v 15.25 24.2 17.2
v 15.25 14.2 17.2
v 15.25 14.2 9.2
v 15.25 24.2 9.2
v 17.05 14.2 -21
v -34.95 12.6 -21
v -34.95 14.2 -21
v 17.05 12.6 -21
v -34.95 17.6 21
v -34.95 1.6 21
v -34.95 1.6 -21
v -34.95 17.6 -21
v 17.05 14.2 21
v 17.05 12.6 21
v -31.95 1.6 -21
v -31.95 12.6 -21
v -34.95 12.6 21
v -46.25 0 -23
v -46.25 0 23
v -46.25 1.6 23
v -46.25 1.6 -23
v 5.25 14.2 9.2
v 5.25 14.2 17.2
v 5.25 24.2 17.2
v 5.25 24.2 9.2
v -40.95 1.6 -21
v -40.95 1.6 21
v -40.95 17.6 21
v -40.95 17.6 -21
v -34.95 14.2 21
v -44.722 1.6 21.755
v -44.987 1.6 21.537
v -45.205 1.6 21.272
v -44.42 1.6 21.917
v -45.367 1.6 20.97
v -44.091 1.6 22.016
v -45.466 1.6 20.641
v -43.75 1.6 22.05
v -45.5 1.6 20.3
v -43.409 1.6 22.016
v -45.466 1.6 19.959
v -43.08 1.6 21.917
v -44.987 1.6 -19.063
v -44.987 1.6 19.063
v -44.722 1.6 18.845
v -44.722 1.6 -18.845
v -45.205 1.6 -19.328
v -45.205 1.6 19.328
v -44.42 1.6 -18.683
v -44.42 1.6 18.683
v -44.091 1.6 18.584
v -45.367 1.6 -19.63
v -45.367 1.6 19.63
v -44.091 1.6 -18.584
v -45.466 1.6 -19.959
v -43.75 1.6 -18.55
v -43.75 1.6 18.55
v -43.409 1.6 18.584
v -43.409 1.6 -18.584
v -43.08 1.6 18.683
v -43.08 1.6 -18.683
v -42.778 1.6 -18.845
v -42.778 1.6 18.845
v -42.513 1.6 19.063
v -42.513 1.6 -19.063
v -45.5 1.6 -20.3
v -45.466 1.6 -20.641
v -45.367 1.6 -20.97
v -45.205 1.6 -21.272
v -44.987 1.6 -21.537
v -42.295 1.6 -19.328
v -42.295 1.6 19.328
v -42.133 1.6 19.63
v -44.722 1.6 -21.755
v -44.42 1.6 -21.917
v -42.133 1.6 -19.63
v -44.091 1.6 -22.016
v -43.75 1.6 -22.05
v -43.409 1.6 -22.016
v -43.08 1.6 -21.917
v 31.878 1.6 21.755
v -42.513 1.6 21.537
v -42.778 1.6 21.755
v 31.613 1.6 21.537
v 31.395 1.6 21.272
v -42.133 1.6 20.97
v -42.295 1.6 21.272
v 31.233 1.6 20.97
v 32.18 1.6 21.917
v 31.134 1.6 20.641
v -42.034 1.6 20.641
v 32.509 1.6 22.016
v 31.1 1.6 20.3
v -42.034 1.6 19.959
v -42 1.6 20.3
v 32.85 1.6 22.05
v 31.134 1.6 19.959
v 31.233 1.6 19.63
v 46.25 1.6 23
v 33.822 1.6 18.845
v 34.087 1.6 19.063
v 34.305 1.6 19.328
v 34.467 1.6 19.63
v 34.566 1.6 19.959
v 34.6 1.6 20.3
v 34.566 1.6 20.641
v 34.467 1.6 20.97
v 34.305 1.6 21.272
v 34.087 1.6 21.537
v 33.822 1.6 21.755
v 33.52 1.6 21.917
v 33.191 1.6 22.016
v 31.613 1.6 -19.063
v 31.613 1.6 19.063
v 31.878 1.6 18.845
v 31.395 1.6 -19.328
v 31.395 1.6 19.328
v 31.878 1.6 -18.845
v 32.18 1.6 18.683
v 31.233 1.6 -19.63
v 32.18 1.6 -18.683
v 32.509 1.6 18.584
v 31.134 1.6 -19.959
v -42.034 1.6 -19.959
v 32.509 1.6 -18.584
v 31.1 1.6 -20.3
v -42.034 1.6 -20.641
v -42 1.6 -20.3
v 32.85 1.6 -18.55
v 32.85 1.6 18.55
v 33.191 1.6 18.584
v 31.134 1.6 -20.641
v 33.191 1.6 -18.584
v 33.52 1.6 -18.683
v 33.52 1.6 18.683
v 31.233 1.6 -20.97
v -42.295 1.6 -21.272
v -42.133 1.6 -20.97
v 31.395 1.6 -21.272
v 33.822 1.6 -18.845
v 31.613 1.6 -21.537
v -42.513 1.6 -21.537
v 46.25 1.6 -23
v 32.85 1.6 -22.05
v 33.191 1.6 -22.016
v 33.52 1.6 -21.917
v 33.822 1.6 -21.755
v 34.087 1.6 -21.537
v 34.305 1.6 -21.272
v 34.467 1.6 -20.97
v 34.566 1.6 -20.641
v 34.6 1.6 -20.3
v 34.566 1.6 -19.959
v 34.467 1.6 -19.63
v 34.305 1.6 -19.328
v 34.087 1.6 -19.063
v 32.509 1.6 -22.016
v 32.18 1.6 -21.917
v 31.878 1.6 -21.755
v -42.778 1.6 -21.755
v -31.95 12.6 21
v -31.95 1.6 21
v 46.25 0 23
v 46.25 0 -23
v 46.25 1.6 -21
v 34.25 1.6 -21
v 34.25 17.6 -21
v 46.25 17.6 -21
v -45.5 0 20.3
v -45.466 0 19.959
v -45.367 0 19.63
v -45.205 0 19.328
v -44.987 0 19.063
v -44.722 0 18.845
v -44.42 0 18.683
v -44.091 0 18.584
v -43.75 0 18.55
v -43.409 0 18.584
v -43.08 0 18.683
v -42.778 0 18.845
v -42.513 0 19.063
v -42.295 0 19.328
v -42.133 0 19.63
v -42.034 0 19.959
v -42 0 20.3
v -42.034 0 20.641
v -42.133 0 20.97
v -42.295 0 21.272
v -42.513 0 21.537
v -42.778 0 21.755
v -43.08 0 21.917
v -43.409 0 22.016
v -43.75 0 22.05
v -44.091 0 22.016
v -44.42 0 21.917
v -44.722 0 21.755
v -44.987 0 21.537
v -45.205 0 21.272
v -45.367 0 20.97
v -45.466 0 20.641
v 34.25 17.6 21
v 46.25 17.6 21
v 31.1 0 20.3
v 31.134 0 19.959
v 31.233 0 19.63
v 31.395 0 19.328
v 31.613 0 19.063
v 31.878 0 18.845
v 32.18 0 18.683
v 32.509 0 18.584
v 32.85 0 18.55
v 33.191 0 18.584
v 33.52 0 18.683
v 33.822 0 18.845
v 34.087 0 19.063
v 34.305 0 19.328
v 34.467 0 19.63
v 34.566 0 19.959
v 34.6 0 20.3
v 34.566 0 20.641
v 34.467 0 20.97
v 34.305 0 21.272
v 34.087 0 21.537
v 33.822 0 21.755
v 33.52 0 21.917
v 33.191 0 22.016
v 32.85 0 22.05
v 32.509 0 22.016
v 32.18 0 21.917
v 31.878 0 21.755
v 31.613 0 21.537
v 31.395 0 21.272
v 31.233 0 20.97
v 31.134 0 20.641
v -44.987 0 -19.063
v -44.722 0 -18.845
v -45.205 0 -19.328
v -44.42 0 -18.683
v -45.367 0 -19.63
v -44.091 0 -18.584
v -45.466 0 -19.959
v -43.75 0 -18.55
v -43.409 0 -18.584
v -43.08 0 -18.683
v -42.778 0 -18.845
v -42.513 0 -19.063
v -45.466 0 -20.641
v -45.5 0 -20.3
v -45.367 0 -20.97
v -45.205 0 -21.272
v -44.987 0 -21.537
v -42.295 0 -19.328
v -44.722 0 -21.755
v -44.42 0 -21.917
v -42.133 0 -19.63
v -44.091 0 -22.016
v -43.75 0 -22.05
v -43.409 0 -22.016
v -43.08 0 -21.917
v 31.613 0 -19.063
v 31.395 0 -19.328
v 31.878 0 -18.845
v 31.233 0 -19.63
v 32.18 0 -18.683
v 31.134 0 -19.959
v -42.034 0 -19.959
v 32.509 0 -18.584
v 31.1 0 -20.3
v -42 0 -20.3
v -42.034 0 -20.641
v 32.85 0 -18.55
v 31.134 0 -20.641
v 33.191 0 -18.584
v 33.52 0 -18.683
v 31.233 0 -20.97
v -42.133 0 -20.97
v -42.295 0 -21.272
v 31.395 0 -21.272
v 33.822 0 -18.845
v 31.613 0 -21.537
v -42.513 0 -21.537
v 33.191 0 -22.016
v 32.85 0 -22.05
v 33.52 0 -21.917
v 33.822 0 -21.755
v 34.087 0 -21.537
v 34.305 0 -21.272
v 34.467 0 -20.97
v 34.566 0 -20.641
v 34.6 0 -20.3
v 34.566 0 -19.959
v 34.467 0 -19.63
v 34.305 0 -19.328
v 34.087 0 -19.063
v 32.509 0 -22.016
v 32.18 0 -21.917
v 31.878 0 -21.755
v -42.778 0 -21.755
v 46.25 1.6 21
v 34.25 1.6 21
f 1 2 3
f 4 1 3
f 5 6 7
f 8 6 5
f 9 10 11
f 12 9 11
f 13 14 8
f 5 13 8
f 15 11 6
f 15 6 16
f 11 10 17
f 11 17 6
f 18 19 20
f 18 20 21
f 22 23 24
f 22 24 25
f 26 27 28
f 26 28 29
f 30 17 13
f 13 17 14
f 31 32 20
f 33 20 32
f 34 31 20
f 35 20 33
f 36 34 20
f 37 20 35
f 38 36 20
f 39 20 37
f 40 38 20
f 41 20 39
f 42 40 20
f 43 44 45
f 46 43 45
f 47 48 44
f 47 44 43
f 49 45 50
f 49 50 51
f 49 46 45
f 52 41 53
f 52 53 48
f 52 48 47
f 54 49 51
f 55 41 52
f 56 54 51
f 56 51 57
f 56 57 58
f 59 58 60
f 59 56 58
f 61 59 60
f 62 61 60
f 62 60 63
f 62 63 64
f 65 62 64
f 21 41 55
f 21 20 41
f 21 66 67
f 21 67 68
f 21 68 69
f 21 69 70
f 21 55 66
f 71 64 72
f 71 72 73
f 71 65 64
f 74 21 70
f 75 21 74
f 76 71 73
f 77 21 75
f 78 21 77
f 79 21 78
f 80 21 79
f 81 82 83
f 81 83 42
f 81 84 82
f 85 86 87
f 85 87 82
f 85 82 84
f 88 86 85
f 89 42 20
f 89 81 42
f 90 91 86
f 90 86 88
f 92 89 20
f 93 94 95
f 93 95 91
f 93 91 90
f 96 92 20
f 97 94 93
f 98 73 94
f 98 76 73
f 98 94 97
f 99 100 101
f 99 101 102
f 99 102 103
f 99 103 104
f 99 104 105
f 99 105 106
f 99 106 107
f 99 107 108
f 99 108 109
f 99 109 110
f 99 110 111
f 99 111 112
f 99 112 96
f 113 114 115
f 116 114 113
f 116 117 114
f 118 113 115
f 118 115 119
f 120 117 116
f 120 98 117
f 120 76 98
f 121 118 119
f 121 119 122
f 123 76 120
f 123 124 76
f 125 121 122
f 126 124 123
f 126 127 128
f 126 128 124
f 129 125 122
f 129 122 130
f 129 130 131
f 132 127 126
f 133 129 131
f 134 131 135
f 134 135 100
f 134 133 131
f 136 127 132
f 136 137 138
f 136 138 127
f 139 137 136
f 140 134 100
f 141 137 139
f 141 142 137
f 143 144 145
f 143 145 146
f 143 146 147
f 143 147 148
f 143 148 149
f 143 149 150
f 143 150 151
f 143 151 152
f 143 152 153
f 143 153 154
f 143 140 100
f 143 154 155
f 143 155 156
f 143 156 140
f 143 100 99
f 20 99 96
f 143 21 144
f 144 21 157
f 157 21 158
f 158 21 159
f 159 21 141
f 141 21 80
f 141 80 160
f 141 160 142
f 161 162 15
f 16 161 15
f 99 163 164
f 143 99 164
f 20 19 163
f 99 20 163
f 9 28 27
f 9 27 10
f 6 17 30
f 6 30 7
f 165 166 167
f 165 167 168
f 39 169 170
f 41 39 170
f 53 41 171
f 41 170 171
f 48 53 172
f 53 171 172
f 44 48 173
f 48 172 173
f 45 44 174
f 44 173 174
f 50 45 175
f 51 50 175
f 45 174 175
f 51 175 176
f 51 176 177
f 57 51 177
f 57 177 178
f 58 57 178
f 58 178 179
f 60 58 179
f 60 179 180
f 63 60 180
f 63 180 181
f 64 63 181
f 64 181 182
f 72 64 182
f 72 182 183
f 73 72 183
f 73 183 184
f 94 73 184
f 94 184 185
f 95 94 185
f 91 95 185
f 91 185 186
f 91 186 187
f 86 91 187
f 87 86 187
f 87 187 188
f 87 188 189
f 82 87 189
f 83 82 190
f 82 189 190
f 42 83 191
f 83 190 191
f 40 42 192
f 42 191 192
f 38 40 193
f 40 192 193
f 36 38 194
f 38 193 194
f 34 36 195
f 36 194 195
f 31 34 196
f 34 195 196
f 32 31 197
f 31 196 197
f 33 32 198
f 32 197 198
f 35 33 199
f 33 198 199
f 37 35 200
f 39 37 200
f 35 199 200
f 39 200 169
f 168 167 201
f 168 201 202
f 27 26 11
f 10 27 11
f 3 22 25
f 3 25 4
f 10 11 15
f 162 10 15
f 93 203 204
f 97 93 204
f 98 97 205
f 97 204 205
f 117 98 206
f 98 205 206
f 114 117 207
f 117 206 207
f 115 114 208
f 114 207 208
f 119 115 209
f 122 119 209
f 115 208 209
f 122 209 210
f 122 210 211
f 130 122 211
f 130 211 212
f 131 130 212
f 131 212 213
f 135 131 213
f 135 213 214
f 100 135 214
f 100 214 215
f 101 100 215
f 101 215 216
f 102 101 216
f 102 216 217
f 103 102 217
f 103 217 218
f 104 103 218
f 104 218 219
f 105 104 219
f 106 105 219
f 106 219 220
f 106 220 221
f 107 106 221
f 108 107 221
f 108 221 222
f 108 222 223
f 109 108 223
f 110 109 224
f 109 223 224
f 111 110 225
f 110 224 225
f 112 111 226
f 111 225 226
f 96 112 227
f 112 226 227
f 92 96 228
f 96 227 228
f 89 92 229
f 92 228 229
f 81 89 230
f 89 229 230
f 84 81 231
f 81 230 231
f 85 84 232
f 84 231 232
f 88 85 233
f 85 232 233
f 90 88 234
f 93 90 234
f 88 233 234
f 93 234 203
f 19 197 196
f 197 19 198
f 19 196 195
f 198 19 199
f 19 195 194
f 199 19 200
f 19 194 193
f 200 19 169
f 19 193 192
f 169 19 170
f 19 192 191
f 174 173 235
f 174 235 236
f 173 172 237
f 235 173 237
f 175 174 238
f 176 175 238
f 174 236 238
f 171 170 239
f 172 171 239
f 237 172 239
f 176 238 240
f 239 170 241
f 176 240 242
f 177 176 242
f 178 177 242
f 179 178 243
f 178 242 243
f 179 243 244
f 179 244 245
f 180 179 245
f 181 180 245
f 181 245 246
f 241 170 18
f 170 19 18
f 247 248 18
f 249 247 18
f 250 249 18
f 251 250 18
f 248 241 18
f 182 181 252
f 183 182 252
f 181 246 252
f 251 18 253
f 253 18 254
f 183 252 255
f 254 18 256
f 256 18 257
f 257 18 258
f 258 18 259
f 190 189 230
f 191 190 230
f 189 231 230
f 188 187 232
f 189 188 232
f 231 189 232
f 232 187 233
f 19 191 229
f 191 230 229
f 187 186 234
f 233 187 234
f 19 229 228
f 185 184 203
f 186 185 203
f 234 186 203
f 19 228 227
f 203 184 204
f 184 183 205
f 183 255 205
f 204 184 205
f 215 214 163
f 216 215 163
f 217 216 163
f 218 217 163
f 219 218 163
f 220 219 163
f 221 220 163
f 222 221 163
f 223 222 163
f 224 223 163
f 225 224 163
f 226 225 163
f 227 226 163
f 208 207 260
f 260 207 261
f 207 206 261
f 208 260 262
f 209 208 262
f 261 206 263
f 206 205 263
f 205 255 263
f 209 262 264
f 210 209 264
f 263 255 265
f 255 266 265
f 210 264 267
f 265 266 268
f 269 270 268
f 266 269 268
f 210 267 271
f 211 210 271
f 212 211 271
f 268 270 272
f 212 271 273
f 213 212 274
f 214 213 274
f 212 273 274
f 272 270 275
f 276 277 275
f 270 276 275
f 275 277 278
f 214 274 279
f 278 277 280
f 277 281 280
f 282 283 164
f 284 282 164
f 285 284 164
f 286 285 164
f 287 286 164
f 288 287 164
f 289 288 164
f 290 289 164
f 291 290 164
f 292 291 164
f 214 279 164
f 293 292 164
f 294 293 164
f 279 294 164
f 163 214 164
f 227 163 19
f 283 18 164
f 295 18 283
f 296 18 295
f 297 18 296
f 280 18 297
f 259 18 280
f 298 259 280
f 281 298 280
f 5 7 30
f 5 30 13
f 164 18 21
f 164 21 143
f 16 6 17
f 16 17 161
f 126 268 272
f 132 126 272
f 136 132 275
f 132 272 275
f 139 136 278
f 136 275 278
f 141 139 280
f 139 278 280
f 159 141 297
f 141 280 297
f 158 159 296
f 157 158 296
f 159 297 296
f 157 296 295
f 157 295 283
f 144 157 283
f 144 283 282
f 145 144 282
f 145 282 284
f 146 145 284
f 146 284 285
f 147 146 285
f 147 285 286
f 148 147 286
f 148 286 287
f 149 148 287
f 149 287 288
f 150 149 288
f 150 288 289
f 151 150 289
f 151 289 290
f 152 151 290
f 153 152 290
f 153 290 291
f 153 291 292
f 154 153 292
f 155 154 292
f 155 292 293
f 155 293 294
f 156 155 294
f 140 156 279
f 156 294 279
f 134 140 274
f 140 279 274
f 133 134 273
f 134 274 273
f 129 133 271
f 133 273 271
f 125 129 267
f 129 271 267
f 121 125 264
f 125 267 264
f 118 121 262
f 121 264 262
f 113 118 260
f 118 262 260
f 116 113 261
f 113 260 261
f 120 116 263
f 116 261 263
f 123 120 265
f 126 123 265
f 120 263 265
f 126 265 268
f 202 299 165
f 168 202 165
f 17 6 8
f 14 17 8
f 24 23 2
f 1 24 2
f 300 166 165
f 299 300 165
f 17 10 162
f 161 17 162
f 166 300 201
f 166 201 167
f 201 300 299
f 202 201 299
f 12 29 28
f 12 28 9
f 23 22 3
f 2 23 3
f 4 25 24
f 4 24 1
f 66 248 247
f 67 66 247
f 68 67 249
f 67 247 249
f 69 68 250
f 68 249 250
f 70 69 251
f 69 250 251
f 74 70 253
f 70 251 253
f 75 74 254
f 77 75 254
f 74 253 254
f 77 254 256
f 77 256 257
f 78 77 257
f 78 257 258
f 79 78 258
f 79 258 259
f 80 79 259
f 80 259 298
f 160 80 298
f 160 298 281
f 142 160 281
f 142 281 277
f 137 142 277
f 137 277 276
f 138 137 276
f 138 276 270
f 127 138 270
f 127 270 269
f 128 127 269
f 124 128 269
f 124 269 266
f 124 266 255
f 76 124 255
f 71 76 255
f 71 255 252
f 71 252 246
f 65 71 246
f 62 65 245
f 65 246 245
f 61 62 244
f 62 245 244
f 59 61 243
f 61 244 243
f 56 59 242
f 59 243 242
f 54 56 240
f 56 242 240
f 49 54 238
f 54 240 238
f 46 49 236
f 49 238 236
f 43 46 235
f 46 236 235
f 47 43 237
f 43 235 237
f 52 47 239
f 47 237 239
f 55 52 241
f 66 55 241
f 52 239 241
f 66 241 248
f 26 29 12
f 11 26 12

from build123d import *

# Parameters (mm, degrees)
SKICA1_W                  = 92.5
SKICA1_H                  = 46
P_IDAT_VYSUNUT_M1_DEPTH   = 1.6
F_3_5_3_5_PR_M_R_D_RY1_D  = 3.5
SKICA4_W                  = 6
SKICA4_H                  = 42
P_IDAT_VYSUNUT_M2_DEPTH   = 16
SKICA4_W_2                = 12
P_IDAT_VYSUNUT_M2_2_DEPTH = 16
SKICA5_W                  = 3
SKICA5_H                  = 42
P_IDAT_VYSUNUT_M3_DEPTH   = 11
SKICA6_W                  = 52
SKICA6_H                  = 42
P_IDAT_VYSUNUT_M4_DEPTH   = 1.6
SKICA7_W                  = 10
SKICA7_H                  = 8
P_IDAT_VYSUNUT_M5_DEPTH   = 10


with BuildPart() as part:
    # Skica1 → Přidat vysunutím1 (new body)
    with BuildSketch(Plane(origin=(0, 0, 0), x_dir=(1, 0, 0), z_dir=(0, 1, 0))):
        Rectangle(SKICA1_W, SKICA1_H)
    extrude(amount=P_IDAT_VYSUNUT_M1_DEPTH)

    # Ø3.5 (3.5) průměr díry1 (through all)
    with Locations(Plane(origin=(0, 1.6, 0), x_dir=(1, 0, 0), z_dir=(0, 1, 0))):
        with Locations((-43.75, 20.3), (-43.75, -20.3), (32.85, -20.3), (32.85, 20.3)):
            Hole(F_3_5_3_5_PR_M_R_D_RY1_D / 2)


with BuildPart() as body_2:
    # Skica4 → Přidat vysunutím2 (new body)
    with BuildSketch(Plane(origin=(0, 1.6, 0), x_dir=(1, 0, 0), z_dir=(0, 1, 0))):
        with Locations((-37.95, 0)):
            Rectangle(SKICA4_W, SKICA4_H)
    extrude(amount=P_IDAT_VYSUNUT_M2_DEPTH)


with BuildPart() as body_3:
    # Skica4 → P_idat vysunut_m2 2 (new body)
    with BuildSketch(Plane(origin=(0, 1.6, 0), x_dir=(1, 0, 0), z_dir=(0, 1, 0))):
        with Locations((40.25, 0)):
            Rectangle(SKICA4_W_2, SKICA4_H)
    extrude(amount=P_IDAT_VYSUNUT_M2_2_DEPTH)


with BuildPart() as body_4:
    # Skica5 → Přidat vysunutím3 (new body)
    with BuildSketch(Plane(origin=(0, 1.6, 0), x_dir=(1, 0, 0), z_dir=(0, 1, 0))):
        with Locations((-33.45, 0)):
            Rectangle(SKICA5_W, SKICA5_H)
    extrude(amount=P_IDAT_VYSUNUT_M3_DEPTH)


with BuildPart() as body_5:
    # Skica6 → Přidat vysunutím4 (new body)
    with BuildSketch(Plane(origin=(0, 12.6, 0), x_dir=(1, 0, 0), z_dir=(0, 1, 0))):
        with Locations((-8.95, 0)):
            Rectangle(SKICA6_W, SKICA6_H)
    extrude(amount=P_IDAT_VYSUNUT_M4_DEPTH)


with BuildPart() as body_6:
    # Skica7 → Přidat vysunutím5 (new body)
    with BuildSketch(Plane(origin=(0, 14.2, 0), x_dir=(1, 0, 0), z_dir=(0, 1, 0))):
        with Locations((10.25, -13.2)):
            Rectangle(SKICA7_W, SKICA7_H)
    extrude(amount=P_IDAT_VYSUNUT_M5_DEPTH)


solid = Compound([part.part, body_2.part, body_3.part, body_4.part, body_5.part, body_6.part])
